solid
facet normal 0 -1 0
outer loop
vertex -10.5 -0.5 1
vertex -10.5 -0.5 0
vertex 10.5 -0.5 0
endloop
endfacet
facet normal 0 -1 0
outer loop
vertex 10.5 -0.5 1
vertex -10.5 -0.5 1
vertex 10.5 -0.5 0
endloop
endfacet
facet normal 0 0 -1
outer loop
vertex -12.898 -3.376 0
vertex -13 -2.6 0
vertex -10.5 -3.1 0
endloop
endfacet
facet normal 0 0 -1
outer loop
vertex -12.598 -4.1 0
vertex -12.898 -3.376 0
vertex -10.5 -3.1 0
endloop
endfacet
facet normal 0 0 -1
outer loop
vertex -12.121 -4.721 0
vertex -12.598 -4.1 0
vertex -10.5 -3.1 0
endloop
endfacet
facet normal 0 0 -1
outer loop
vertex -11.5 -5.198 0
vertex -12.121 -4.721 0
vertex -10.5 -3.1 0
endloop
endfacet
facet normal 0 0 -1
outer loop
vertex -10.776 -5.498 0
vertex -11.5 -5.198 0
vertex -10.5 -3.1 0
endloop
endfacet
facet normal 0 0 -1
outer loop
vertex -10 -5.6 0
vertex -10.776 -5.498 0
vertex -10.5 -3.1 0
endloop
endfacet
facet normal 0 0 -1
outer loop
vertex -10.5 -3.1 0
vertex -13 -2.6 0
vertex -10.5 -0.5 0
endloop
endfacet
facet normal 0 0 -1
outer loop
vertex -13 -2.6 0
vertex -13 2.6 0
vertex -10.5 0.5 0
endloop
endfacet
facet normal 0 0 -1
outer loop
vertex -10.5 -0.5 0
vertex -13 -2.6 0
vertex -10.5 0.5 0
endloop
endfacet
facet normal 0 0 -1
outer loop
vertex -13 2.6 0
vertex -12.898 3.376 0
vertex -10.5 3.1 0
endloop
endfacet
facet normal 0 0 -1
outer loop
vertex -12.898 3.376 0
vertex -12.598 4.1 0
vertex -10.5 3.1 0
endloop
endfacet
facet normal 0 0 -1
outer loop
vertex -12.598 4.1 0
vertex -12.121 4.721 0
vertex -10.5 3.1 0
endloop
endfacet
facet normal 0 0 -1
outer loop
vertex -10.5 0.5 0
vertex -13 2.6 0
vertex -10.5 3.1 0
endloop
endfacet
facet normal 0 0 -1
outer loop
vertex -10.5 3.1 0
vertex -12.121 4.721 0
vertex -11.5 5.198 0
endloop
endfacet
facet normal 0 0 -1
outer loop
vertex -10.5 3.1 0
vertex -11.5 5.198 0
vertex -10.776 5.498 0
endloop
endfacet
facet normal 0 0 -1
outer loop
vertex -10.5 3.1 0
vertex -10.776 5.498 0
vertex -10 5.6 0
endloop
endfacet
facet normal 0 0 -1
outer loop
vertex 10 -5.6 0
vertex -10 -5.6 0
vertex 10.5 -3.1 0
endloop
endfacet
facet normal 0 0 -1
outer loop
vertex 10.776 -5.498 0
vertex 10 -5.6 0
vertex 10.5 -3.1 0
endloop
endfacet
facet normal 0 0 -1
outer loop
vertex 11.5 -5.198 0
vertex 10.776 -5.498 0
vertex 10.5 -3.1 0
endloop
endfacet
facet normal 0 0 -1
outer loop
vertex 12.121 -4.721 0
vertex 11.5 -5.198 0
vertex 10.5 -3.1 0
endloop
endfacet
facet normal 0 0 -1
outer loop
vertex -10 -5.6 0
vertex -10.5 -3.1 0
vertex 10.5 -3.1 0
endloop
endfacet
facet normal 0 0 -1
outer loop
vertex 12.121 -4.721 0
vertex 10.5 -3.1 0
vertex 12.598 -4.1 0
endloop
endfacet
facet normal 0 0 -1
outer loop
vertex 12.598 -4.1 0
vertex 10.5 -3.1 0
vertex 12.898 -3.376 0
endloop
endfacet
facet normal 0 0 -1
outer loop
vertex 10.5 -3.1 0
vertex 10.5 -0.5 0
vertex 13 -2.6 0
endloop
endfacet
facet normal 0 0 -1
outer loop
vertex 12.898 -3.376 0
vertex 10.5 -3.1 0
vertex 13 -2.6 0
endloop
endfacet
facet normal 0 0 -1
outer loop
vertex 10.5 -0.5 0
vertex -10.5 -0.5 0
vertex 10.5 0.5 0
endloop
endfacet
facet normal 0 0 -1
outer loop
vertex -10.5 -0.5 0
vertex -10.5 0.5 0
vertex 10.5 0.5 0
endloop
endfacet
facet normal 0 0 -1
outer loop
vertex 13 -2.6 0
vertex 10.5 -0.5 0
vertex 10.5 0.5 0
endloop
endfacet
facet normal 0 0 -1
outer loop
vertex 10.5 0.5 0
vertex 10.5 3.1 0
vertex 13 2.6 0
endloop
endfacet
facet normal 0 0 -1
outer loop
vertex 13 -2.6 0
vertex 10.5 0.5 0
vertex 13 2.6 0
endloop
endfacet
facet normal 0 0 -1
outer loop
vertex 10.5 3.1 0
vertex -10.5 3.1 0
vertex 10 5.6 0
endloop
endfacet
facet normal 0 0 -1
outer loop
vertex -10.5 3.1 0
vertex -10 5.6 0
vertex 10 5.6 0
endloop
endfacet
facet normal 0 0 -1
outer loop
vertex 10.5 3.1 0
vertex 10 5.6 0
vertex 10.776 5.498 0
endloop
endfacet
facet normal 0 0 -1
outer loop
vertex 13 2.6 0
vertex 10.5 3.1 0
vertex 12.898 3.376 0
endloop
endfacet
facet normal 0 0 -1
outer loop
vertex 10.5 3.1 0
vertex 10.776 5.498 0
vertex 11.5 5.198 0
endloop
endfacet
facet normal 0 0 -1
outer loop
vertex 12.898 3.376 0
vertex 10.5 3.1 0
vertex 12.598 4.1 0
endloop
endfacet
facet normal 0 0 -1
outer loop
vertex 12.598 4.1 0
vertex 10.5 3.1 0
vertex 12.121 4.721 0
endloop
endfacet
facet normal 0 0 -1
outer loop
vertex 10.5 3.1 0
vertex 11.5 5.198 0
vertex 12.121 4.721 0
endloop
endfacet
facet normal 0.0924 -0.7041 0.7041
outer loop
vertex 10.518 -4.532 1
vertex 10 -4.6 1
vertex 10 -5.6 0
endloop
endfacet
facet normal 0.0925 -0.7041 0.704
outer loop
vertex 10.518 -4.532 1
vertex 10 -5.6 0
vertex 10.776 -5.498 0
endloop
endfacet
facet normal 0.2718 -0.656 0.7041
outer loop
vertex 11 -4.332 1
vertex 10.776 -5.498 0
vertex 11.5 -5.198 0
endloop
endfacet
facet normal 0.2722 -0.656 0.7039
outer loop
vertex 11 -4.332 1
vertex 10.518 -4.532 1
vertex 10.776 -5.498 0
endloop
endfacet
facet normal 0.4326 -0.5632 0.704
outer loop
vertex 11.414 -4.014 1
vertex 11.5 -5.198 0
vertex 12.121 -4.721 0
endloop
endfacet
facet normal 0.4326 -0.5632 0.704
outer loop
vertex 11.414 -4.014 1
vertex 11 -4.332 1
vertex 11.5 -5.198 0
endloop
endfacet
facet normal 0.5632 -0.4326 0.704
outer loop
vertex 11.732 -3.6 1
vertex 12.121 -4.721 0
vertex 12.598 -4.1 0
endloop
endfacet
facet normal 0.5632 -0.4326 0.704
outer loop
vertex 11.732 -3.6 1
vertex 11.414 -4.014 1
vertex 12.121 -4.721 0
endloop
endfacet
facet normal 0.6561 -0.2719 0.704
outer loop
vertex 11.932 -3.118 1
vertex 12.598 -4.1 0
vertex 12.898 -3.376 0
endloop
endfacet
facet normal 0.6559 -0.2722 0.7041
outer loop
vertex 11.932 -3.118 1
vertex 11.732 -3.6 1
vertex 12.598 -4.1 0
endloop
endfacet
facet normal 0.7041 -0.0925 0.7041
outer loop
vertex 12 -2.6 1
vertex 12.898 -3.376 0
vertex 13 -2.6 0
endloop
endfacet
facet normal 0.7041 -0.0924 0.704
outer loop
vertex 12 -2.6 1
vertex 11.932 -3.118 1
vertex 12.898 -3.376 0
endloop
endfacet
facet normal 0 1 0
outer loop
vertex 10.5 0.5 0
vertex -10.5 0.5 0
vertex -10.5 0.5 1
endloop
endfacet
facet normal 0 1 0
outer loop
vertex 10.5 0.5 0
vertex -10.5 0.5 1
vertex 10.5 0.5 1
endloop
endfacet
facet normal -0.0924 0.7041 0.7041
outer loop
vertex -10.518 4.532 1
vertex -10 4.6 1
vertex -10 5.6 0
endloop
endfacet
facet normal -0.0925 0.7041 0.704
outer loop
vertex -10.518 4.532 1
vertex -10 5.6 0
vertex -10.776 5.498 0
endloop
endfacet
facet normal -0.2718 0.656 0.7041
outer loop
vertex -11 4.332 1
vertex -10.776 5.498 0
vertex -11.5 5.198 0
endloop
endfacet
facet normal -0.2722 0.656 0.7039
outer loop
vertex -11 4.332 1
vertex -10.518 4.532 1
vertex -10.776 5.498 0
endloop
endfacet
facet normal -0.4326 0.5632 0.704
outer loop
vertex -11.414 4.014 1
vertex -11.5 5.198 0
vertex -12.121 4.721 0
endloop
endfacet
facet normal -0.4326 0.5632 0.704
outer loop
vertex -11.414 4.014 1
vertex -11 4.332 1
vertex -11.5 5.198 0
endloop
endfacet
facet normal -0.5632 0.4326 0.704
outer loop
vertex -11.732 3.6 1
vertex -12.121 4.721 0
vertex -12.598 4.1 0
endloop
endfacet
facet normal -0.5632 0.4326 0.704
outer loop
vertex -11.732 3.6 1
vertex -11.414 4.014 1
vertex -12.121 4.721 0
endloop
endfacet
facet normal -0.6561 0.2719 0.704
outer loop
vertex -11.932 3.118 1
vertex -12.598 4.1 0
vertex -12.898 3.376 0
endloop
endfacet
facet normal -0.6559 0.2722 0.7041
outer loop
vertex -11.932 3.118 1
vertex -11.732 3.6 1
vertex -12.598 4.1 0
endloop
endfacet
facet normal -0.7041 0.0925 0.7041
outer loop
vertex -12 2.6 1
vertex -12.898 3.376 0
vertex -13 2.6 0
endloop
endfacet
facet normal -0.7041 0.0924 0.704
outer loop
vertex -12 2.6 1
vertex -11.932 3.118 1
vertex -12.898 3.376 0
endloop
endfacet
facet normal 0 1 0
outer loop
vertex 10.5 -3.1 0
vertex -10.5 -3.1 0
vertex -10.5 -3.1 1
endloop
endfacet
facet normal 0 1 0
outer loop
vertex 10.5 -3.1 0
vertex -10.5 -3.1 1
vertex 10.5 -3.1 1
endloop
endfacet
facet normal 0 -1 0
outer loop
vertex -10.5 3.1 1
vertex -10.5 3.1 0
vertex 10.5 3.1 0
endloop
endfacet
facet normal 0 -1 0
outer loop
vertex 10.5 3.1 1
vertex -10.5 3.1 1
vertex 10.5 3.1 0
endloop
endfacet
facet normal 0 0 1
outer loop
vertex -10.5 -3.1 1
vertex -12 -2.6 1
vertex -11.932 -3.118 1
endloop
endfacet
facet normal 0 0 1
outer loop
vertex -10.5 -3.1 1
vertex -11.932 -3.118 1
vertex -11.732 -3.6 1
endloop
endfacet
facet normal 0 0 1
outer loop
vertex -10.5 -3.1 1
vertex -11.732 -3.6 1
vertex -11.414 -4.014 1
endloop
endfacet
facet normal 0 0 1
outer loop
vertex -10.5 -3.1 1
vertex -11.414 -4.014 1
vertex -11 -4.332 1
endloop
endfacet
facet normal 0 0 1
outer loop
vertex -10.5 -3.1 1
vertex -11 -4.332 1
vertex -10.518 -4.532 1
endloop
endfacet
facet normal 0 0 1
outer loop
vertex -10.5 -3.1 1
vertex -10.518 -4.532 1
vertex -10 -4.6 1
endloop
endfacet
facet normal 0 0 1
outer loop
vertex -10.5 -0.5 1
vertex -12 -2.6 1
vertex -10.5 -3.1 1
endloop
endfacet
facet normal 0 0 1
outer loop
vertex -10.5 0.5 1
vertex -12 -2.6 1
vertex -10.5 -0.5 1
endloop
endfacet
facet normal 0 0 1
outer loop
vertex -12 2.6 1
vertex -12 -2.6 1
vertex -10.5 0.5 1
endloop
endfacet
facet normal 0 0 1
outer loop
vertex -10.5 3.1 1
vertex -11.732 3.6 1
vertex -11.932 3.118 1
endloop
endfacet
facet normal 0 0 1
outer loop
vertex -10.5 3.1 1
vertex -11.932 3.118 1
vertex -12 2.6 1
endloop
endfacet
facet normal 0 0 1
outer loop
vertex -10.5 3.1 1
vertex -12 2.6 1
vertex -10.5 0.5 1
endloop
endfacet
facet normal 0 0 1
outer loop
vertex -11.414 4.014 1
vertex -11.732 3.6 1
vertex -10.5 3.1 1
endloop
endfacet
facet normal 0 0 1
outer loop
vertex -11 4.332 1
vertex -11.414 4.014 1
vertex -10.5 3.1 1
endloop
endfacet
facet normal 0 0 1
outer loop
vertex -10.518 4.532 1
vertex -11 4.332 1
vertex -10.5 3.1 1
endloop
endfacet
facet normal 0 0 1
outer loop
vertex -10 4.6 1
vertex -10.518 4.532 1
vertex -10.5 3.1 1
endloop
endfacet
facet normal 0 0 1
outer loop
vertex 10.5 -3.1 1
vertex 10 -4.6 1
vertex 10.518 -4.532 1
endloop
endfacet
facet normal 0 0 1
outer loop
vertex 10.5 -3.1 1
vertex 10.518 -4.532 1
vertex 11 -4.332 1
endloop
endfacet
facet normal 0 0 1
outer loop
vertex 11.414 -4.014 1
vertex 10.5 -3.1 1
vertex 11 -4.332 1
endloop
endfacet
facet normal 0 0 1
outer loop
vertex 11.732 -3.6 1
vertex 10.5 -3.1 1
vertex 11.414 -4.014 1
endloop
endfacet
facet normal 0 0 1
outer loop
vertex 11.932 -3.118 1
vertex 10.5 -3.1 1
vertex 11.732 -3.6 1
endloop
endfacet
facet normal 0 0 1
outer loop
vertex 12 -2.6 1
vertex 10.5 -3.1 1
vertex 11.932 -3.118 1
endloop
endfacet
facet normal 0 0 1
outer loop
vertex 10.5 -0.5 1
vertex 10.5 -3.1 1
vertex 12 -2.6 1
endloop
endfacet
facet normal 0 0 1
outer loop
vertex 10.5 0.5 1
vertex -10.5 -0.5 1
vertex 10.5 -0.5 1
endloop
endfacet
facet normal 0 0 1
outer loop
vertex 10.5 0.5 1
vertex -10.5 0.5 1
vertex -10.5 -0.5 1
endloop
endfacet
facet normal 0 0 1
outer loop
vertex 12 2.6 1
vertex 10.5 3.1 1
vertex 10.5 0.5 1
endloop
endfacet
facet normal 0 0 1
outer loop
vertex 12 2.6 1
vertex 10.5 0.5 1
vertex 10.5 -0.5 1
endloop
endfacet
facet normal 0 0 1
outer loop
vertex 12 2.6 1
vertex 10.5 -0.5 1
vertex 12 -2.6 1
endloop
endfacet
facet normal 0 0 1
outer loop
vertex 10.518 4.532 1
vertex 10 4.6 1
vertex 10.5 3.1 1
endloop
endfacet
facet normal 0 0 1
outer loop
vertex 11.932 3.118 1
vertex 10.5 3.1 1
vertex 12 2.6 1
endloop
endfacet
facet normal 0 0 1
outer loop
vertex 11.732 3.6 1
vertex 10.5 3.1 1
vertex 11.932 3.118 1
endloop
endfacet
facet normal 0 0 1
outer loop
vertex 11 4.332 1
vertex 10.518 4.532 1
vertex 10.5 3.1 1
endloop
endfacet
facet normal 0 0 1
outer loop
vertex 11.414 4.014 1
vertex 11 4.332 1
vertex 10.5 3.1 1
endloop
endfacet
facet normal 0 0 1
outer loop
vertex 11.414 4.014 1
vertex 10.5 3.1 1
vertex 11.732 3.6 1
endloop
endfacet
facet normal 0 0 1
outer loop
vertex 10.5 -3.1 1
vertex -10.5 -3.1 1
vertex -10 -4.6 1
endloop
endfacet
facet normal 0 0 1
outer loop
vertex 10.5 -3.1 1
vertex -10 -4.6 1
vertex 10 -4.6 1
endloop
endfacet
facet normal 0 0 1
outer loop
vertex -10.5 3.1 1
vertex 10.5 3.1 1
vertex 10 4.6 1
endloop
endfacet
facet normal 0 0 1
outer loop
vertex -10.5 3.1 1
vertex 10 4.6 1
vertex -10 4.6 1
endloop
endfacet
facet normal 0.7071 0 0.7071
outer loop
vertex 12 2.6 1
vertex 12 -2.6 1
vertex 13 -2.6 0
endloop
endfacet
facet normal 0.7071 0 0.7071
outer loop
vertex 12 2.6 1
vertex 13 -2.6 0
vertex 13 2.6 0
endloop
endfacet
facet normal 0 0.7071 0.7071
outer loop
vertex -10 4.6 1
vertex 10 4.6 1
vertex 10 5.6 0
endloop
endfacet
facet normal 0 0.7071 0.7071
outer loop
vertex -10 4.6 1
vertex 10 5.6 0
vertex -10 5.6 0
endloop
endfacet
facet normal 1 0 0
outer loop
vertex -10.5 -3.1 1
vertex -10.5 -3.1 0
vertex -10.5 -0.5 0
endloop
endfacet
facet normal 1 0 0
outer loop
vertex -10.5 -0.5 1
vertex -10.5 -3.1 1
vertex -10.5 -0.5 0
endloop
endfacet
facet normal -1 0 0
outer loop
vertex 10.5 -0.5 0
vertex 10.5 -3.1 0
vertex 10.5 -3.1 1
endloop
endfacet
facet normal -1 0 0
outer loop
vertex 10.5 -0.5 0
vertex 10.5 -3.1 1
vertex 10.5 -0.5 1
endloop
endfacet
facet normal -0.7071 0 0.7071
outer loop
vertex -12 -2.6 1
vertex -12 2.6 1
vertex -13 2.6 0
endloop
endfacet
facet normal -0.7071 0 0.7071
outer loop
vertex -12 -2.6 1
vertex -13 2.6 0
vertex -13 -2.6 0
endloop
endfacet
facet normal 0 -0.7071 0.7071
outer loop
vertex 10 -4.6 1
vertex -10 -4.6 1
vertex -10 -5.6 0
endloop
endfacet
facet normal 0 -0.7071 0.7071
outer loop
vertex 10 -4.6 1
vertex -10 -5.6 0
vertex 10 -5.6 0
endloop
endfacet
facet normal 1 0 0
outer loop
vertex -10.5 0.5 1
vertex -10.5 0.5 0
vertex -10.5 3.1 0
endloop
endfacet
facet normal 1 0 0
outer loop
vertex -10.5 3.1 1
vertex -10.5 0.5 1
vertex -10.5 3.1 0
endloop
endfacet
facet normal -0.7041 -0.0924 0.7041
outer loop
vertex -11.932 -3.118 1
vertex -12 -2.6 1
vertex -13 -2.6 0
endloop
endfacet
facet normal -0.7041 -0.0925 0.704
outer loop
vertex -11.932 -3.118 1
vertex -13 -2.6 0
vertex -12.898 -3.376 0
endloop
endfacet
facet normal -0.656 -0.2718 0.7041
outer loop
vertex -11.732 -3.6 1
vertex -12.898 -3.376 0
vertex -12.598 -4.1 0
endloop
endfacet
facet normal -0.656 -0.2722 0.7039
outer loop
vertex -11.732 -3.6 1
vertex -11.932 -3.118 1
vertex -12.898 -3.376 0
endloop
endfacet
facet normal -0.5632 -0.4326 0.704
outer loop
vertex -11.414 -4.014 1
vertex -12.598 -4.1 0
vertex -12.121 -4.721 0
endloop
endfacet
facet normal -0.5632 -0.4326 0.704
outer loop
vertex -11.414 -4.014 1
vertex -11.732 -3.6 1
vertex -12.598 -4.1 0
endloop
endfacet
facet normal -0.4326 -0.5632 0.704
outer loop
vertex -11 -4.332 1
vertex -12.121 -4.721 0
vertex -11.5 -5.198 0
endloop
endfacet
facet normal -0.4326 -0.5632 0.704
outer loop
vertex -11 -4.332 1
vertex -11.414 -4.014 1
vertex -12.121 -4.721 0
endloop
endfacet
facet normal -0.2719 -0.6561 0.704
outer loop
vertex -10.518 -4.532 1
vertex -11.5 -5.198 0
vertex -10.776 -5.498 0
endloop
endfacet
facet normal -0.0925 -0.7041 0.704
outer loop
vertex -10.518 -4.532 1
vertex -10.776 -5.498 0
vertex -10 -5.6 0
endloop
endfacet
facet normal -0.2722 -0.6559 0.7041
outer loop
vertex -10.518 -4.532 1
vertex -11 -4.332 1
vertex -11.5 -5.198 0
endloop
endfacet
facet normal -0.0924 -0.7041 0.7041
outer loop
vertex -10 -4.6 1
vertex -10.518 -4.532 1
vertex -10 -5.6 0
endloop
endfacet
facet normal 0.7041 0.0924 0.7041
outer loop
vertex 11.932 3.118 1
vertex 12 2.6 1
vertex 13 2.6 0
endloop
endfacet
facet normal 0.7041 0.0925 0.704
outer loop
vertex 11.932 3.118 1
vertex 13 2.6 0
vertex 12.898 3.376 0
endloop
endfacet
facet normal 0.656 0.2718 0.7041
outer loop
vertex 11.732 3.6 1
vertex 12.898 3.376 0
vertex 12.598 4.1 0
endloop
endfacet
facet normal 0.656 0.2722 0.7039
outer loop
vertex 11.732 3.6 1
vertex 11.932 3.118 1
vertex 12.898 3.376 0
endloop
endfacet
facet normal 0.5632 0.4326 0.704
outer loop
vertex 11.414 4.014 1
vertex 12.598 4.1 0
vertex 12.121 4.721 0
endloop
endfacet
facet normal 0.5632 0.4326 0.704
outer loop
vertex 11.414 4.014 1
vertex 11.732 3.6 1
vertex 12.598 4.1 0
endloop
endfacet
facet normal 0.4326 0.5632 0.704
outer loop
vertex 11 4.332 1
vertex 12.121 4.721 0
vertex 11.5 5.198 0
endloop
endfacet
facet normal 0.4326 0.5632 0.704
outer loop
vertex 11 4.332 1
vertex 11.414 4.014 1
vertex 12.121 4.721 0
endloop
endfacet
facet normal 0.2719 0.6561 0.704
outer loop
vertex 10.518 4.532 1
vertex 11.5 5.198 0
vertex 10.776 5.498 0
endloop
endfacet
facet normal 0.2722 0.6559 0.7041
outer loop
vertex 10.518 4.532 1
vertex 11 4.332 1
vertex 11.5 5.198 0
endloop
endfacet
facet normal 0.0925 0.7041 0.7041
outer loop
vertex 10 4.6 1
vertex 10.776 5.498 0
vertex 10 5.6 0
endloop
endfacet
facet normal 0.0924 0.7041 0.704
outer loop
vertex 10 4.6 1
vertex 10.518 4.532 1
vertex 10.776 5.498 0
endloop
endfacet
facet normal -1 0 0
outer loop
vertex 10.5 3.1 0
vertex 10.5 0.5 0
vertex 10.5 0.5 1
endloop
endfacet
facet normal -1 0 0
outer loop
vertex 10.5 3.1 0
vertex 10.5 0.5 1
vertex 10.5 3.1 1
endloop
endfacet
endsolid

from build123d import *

# Parameters (mm, degrees)
F0_W     = 26
F0_H     = 11.2
F0_W_2   = 21
F0_H_2   = 2.6
F1_DEPTH = 1
F2_R     = 3
F3_SIZE  = 0.99999


# Not quite as in the source:
# - a fillet or chamfer is up to 0.001 mm smaller than in the source, because OpenCascade refuses the exact size


with BuildPart() as f1:
    # F0 (on Top) → F1 (new body)
    with BuildSketch(Plane.XY):
        Rectangle(F0_W, F0_H)
        with Locations((0, -1.8)):
            Rectangle(F0_W_2, F0_H_2, mode=Mode.SUBTRACT)
        with Locations((0, 1.8)):
            Rectangle(F0_W_2, F0_H_2, mode=Mode.SUBTRACT)
    extrude(amount=F1_DEPTH)

    # F2
    f2_edges = [f1.edges().sort_by_distance(p)[0] for p in [
        (-13, 5.6, 0.5),
        (-13, -5.6, 0.5),
        (13, -5.6, 0.5),
        (13, 5.6, 0.5),
    ]]
    fillet(f2_edges, radius=F2_R)

    # F3 (size 1 in the source; OpenCascade refuses exactly that, so slightly less here)
    f3_edges = [f1.edges().sort_by_distance(p)[0] for p in [
        (-12.12132, -4.72132, 1),
    ]]
    chamfer(f3_edges, length=F3_SIZE)


solid = f1.part
